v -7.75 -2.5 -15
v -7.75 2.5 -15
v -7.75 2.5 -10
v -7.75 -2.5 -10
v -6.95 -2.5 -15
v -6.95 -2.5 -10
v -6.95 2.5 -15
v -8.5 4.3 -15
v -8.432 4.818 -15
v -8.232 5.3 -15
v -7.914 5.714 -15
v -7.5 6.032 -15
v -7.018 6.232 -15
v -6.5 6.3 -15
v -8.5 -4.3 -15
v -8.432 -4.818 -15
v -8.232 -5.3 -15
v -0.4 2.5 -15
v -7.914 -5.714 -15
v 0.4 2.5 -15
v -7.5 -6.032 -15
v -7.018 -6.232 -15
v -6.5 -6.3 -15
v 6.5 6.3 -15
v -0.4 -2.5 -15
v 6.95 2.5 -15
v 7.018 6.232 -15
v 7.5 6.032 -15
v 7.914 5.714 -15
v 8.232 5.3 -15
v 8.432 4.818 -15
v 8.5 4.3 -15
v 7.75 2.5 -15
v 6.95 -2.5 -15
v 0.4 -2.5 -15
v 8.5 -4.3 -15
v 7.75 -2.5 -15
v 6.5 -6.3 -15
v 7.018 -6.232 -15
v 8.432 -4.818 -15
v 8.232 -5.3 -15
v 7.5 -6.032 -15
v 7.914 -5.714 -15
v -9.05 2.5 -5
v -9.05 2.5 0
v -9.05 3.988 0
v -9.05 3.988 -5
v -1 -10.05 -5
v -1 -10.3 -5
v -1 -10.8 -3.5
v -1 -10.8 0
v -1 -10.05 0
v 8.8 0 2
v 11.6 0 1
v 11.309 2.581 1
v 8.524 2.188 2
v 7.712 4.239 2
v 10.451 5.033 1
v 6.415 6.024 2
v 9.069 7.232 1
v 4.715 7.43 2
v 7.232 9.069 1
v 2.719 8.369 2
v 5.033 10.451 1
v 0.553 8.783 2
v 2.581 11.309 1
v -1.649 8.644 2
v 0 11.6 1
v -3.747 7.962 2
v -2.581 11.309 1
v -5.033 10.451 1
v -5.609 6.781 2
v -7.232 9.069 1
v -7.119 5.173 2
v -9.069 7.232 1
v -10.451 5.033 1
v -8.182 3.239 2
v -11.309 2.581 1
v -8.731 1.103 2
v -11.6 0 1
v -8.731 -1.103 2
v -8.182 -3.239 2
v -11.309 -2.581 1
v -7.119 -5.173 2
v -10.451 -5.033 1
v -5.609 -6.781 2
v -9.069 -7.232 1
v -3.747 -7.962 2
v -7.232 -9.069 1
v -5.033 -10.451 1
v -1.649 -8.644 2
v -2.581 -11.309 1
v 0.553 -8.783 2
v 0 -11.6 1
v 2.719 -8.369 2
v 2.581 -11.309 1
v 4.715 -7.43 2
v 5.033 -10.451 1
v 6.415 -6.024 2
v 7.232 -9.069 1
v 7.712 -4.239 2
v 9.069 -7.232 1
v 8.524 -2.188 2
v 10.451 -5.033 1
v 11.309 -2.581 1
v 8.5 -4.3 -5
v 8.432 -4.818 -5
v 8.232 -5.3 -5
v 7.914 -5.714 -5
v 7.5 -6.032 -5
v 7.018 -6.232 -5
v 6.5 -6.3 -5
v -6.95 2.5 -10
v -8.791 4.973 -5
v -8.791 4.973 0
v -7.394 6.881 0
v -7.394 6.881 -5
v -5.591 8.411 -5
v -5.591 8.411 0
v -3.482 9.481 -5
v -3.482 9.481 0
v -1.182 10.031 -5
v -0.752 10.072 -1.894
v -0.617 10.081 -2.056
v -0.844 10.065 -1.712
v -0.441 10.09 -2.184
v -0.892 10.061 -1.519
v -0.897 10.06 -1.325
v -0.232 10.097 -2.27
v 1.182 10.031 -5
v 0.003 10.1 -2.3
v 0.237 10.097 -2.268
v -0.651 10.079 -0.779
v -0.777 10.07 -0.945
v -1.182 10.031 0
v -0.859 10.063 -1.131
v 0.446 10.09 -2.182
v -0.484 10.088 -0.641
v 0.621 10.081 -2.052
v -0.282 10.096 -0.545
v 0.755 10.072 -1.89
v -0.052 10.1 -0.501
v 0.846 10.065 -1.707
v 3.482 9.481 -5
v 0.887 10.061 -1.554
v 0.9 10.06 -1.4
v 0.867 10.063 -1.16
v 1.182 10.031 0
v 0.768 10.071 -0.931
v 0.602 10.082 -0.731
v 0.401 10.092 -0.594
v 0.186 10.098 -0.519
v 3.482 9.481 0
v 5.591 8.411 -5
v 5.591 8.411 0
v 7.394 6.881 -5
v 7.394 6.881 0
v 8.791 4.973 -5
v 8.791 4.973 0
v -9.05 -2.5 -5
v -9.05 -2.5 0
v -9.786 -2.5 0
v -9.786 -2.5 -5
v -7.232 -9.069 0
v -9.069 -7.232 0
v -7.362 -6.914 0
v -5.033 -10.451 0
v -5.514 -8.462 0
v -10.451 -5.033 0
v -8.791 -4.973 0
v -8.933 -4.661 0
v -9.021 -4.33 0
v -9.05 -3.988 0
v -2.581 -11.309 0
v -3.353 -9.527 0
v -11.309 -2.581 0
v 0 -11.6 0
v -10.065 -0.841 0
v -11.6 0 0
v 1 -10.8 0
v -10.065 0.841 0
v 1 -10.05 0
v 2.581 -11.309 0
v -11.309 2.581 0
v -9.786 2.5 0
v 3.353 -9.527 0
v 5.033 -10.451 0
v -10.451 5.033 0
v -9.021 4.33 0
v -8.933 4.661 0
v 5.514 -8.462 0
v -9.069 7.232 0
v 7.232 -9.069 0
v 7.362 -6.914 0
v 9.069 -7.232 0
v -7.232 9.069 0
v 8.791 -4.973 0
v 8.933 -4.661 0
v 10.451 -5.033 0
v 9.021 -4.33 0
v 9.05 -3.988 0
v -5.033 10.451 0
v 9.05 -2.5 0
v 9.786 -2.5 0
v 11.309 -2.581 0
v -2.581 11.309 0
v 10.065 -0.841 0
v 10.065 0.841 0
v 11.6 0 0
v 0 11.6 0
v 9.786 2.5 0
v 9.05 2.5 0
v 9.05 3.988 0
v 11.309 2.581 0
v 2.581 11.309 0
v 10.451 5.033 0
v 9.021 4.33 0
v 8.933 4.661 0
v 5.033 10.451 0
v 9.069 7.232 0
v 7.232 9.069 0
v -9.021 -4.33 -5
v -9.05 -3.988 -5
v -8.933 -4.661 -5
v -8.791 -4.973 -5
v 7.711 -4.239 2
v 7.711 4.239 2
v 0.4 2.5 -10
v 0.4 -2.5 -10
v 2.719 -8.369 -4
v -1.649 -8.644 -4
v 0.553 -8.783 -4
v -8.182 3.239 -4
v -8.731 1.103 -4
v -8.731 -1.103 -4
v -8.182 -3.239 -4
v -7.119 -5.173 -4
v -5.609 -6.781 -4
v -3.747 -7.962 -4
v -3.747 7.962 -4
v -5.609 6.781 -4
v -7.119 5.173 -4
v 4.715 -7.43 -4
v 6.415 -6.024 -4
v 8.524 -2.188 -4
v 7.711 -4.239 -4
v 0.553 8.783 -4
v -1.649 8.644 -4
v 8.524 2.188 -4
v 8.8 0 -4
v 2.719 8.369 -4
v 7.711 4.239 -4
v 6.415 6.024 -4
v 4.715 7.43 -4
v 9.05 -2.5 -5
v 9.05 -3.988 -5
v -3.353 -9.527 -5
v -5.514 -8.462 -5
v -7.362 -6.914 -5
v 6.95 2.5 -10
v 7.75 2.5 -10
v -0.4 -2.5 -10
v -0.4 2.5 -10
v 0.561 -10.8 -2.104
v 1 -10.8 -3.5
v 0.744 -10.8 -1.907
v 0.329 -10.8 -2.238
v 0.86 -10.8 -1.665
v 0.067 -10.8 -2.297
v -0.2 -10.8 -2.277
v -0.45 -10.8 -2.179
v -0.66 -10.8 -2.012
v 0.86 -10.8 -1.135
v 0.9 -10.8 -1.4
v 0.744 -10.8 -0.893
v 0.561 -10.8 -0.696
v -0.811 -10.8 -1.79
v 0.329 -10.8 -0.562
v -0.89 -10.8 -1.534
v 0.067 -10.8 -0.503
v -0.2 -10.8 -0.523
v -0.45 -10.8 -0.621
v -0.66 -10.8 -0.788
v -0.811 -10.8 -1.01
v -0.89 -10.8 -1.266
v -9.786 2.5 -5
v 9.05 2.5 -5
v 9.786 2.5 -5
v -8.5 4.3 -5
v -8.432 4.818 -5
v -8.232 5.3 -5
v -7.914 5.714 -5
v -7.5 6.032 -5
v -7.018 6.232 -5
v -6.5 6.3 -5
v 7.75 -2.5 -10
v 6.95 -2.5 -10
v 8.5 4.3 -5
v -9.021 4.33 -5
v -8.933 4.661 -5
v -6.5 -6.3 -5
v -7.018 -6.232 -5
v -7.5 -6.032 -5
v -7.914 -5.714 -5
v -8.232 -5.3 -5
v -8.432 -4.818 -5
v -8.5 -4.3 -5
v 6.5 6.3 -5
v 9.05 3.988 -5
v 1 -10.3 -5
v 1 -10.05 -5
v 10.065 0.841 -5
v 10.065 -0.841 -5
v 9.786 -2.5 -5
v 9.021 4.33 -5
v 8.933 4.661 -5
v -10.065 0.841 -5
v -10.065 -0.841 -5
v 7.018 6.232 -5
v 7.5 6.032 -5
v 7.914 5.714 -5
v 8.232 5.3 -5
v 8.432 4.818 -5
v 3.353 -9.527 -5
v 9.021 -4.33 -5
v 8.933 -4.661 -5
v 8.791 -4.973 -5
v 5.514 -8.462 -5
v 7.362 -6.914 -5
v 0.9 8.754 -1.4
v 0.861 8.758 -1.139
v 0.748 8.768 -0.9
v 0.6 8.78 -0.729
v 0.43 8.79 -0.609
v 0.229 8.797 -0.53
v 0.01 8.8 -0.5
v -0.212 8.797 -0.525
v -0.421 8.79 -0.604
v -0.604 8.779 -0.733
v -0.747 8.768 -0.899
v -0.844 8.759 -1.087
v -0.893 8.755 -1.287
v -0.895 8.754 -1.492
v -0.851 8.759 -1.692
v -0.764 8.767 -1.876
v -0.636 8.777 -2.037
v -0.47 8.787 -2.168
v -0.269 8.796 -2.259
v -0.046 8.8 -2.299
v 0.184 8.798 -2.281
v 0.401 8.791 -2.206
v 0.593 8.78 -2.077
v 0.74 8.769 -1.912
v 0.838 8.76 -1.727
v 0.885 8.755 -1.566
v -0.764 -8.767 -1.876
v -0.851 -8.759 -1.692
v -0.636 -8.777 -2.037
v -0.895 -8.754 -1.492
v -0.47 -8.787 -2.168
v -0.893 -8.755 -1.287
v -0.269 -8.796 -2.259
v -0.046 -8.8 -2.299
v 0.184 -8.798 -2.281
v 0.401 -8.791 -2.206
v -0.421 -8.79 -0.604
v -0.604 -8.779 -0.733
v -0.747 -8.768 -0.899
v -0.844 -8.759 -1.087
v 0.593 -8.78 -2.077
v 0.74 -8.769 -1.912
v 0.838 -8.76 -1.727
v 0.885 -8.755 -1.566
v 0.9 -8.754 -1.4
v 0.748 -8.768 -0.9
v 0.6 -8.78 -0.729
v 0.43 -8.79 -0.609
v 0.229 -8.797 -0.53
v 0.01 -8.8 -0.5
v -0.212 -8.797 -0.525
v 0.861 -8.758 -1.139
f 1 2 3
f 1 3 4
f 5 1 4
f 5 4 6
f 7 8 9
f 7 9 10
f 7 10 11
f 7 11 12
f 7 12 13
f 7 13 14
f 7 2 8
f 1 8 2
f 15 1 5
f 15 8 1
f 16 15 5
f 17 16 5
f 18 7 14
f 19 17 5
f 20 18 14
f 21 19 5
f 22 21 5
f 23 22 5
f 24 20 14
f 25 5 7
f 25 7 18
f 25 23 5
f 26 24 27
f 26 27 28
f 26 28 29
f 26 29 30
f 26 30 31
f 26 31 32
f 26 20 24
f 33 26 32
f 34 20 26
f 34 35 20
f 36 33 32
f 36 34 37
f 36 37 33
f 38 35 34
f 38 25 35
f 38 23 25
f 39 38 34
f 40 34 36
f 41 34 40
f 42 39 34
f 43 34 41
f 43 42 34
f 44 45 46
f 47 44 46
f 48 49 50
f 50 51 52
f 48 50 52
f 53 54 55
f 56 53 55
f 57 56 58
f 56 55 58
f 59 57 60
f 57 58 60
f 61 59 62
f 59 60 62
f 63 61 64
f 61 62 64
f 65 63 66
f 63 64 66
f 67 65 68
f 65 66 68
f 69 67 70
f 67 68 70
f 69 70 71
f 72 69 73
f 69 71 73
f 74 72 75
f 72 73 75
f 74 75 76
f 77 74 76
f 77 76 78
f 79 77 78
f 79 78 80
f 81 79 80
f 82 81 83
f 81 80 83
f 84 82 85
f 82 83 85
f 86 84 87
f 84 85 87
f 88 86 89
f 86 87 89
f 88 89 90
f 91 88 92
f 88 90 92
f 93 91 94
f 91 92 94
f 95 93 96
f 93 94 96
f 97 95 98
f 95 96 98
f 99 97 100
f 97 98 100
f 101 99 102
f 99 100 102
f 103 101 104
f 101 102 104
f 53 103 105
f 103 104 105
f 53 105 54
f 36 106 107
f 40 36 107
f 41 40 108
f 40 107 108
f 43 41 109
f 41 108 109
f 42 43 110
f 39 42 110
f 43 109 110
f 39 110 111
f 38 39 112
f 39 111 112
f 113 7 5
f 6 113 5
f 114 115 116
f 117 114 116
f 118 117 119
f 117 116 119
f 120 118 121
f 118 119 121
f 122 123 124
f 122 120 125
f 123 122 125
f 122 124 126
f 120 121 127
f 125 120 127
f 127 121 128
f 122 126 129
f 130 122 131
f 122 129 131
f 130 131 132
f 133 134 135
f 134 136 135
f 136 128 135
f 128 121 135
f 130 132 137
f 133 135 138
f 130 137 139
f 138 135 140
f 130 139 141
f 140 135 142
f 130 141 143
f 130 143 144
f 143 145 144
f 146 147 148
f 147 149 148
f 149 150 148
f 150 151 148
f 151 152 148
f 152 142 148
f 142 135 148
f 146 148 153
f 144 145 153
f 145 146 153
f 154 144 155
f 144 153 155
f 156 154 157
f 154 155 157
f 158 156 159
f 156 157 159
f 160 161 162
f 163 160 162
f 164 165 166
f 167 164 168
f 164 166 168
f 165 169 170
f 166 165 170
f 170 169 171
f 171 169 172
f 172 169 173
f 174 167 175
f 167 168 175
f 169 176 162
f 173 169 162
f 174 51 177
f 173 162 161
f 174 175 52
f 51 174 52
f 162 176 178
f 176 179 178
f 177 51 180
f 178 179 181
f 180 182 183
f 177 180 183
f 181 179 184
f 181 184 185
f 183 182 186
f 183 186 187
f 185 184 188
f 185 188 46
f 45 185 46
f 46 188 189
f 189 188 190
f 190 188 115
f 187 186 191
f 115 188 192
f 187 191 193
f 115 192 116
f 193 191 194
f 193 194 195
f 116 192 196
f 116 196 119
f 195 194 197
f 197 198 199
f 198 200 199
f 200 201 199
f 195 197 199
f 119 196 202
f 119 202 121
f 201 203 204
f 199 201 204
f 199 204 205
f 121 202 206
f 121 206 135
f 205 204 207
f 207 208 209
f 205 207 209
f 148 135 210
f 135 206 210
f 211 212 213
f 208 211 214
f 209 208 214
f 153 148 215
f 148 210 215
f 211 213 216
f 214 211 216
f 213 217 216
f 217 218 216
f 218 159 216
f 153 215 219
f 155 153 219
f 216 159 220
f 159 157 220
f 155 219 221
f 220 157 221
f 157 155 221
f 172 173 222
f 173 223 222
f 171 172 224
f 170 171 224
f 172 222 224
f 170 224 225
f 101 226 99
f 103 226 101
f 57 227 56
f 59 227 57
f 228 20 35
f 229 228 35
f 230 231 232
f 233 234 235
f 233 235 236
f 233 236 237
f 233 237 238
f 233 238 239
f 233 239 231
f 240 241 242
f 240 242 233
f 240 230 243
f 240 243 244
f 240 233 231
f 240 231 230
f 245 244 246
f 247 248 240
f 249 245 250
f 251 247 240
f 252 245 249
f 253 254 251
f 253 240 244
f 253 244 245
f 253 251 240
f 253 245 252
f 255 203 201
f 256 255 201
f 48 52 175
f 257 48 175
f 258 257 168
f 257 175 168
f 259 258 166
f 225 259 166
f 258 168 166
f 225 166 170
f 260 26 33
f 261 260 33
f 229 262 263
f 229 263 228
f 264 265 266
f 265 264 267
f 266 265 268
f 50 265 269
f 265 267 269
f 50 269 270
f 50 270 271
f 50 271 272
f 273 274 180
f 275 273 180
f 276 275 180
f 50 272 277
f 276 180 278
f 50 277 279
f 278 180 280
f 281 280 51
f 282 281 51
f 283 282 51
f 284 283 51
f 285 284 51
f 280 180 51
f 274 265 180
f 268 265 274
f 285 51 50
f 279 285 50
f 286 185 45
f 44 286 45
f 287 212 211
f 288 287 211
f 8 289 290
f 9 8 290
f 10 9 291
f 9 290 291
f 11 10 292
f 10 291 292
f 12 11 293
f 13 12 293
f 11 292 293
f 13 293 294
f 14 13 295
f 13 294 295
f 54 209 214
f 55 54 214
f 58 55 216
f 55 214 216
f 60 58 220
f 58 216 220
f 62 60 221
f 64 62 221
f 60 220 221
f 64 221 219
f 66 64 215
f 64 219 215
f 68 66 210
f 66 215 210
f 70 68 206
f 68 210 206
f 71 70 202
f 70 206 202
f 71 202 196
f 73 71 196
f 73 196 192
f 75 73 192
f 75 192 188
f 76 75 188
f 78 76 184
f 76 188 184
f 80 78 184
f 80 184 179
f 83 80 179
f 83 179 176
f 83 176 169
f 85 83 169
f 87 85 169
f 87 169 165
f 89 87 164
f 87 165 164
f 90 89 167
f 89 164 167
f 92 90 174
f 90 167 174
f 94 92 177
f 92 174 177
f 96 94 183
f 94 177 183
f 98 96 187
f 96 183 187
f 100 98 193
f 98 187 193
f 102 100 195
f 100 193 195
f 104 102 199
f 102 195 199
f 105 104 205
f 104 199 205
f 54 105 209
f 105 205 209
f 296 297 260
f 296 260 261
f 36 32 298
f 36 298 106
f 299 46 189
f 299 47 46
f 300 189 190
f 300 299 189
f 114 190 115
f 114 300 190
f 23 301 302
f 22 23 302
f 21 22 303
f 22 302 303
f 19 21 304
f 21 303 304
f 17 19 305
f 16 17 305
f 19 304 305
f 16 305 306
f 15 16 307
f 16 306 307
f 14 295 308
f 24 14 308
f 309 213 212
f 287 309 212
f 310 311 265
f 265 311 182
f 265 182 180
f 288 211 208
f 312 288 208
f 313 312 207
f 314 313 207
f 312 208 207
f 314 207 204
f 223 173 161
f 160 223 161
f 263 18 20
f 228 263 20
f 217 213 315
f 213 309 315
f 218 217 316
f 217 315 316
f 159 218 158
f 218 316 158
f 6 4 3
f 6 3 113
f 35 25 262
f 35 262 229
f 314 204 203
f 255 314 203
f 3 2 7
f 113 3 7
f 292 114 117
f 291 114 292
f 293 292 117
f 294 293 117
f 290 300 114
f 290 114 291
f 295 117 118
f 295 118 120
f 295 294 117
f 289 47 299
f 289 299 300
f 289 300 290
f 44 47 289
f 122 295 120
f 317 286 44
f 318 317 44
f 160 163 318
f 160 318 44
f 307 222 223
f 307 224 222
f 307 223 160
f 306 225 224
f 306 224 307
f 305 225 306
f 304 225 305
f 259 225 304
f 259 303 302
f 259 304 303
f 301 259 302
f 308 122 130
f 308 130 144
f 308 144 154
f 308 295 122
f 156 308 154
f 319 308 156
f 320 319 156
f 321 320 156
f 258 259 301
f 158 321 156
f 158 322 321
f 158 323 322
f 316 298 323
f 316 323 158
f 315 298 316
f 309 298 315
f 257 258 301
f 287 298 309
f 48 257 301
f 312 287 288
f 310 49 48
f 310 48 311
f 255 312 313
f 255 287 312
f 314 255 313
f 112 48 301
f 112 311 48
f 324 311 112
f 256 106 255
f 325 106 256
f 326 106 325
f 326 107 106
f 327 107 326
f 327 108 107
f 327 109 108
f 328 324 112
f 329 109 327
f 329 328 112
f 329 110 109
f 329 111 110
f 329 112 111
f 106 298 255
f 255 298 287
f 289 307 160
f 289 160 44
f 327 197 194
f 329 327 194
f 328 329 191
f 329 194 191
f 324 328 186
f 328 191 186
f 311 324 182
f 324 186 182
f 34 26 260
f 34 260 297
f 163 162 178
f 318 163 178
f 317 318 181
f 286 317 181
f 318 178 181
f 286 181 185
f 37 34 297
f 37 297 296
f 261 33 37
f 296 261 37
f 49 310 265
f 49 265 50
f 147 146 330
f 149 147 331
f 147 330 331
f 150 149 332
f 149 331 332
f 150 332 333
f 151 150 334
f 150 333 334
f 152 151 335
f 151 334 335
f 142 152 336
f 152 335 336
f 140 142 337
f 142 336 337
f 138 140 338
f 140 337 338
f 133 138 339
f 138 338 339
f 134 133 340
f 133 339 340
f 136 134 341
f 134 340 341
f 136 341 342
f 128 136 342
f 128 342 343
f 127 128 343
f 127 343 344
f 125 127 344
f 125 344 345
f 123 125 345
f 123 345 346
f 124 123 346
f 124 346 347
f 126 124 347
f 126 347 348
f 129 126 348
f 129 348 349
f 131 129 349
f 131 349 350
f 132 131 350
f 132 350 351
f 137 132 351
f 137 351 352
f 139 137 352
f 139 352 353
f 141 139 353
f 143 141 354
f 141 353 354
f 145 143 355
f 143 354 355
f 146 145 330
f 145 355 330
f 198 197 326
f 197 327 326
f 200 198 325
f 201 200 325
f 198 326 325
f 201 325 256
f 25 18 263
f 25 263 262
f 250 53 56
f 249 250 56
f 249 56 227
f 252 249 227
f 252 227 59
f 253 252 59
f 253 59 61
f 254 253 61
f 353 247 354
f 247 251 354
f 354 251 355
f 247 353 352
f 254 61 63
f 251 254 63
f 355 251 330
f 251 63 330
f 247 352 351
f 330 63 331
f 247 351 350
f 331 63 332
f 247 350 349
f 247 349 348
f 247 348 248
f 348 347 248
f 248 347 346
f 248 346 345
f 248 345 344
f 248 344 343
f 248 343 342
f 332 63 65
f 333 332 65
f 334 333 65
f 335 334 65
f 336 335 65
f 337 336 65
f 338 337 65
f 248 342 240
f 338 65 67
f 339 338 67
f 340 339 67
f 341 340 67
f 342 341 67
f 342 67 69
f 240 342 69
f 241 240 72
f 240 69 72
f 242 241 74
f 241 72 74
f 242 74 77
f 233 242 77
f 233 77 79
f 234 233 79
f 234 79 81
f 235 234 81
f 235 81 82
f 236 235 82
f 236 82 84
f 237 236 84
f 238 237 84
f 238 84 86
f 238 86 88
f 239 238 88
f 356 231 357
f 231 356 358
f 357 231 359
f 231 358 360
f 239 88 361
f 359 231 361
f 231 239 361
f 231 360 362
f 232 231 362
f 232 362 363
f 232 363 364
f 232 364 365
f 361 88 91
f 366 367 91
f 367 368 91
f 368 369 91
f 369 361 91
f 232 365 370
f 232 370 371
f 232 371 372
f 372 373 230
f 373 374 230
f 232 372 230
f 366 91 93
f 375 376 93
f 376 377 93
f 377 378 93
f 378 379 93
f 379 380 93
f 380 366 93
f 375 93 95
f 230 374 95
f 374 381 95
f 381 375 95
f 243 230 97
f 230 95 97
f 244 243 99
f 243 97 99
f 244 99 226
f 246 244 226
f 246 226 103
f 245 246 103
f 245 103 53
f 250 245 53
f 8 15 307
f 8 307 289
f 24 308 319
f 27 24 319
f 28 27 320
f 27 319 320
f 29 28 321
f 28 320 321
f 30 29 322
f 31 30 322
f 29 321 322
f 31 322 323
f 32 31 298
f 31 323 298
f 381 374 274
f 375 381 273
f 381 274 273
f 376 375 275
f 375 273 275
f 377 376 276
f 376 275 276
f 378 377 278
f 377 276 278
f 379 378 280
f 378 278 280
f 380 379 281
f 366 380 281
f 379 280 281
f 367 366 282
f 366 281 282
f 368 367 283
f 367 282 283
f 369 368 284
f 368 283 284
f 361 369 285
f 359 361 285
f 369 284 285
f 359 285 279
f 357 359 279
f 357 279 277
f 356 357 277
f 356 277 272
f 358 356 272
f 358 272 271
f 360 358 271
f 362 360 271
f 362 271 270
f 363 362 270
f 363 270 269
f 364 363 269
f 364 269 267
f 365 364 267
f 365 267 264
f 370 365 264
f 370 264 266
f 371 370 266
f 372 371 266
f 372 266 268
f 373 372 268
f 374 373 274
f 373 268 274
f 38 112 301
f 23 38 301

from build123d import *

# Parameters (mm, degrees)
F0_R      = 11.6
F1_DEPTH  = 2
F3_DEPTH  = 5
F5_DEPTH  = 10
F6_W      = 0.8
F6_H      = 5
F7_DEPTH  = 5
F8_R      = 8.8
F9_DEPTH  = 6
F10_SIZE2 = 0.99999
F10_SIZE  = 2.79999
F11_R     = 2
F12_SIZE2 = 0.5
F12_SIZE  = 1.5
F13_R     = 0.9
F14_DEPTH = 22.4013731274


# Not quite as in the source:
# - a fillet or chamfer is up to 0.001 mm smaller than in the source, because OpenCascade refuses the exact size


with BuildPart() as f1:
    # F0 (on Top) → F1 (new body)
    with BuildSketch(Plane.XY):
        Circle(F0_R)
    extrude(amount=F1_DEPTH)

    # F2 (on face) → F3 (join)
    with BuildSketch(Plane(origin=(0, 0, 0), x_dir=(1, 0, 0), z_dir=(0, 0, -1))):
        with BuildLine():
            Line((-9.05, -2.5), (-9.05, -4.4841387133))
            ThreePointArc((-9.05, -4.4841387133), (0, -10.1), (9.05, -4.4841387133))
            Line((9.05, -4.4841387133), (9.05, -2.5))
            Line((9.05, -2.5), (9.05, 2.5))
            Line((9.05, 2.5), (9.05, 4.4841387133))
            ThreePointArc((9.05, 4.4841387133), (5.7442463725, 8.3074444694), (1, 10.0503731274))
            Line((1, 10.0503731274), (1, 10.8003731274))
            Line((1, 10.8003731274), (-1, 10.8003731274))
            Line((-1, 10.8003731274), (-1, 10.0503731274))
            ThreePointArc((-1, 10.0503731274), (-5.7442463725, 8.3074444694), (-9.05, 4.4841387133))
            Line((-9.05, 4.4841387133), (-9.05, 2.5))
            Line((-9.05, 2.5), (-9.05, -2.5))
        make_face()
        with BuildLine():
            Line((-9.7857038582, -2.5), (-9.05, -2.5))
            Line((-9.05, -2.5), (-9.05, 2.5))
            Line((-9.05, 2.5), (-9.7857038582, 2.5))
            ThreePointArc((-9.7857038582, 2.5), (-10.1, 0), (-9.7857038582, -2.5))
        make_face()
        with BuildLine():
            Line((9.05, 2.5), (9.05, -2.5))
            Line((9.05, -2.5), (9.7857038582, -2.5))
            ThreePointArc((9.7857038582, -2.5), (10.1, 0), (9.7857038582, 2.5))
            Line((9.7857038582, 2.5), (9.05, 2.5))
        make_face()
    extrude(amount=F3_DEPTH)

    # F4 (on face) → F5 (join)
    with BuildSketch(Plane(origin=(0, 0, -5), x_dir=(1, 0, 0), z_dir=(0, 0, -1))):
        with BuildLine():
            Line((6.5, 6.3), (-6.5, 6.3))
            ThreePointArc((-6.5, 6.3), (-7.9142135624, 5.7142135624), (-8.5, 4.3))
            Line((-8.5, 4.3), (-8.5, -4.3))
            ThreePointArc((-8.5, -4.3), (-7.9142135624, -5.7142135624), (-6.5, -6.3))
            Line((-6.5, -6.3), (6.5, -6.3))
            ThreePointArc((6.5, -6.3), (7.9142135624, -5.7142135624), (8.5, -4.3))
            Line((8.5, -4.3), (8.5, 4.3))
            ThreePointArc((8.5, 4.3), (7.9142135624, 5.7142135624), (6.5, 6.3))
        make_face()
    extrude(amount=F5_DEPTH)

    # F6 (on face) → F7 (cut)
    with BuildSketch(Plane(origin=(0, 0, -15), x_dir=(1, 0, 0), z_dir=(0, 0, -1))):
        Rectangle(F6_W, F6_H)
        with Locations((-7.35, 0)):
            Rectangle(F6_W, F6_H)
        with Locations((7.35, 0)):
            Rectangle(F6_W, F6_H)
    extrude(amount=-F7_DEPTH, mode=Mode.SUBTRACT)

    # F8 (on face) → F9 (cut)
    with BuildSketch(Plane.XY.offset(2)):
        Circle(F8_R)
    extrude(amount=-F9_DEPTH, mode=Mode.SUBTRACT)

    # F10 (size 2.8 and 1 in the source; OpenCascade refuses exactly that, so slightly less here)
    f10_edges = [f1.edges().sort_by_distance(p)[0] for p in [
        (-11.6, 0, 2),
    ]]
    f10_side = f1.faces().sort_by_distance((-11.271902, 0, 2))[0]
    chamfer(f10_edges, length=F10_SIZE, length2=F10_SIZE2, reference=f10_side)

    # F11
    f11_edges = [f1.edges().sort_by_distance(p)[0] for p in [
        (-9.05, 4.484139, -2.5),
        (-9.05, -4.484139, -2.5),
        (9.05, -4.484139, -2.5),
        (9.05, 4.484139, -2.5),
    ]]
    fillet(f11_edges, radius=F11_R)

    # F12
    f12_edges = [f1.edges().sort_by_distance(p)[0] for p in [
        (0, -10.800373, -5),
    ]]
    f12_side = f1.faces().sort_by_distance((0, -10.800373, -2.5))[0]
    chamfer(f12_edges, length=F12_SIZE, length2=F12_SIZE2, reference=f12_side)

    # F13 (on face) → F14 (cut, through all)
    with BuildSketch(Plane.XZ.offset(10.8003731274)):
        with Locations((0, -1.4)):
            Circle(F13_R)
    extrude(amount=-F14_DEPTH, mode=Mode.SUBTRACT)


solid = f1.part
